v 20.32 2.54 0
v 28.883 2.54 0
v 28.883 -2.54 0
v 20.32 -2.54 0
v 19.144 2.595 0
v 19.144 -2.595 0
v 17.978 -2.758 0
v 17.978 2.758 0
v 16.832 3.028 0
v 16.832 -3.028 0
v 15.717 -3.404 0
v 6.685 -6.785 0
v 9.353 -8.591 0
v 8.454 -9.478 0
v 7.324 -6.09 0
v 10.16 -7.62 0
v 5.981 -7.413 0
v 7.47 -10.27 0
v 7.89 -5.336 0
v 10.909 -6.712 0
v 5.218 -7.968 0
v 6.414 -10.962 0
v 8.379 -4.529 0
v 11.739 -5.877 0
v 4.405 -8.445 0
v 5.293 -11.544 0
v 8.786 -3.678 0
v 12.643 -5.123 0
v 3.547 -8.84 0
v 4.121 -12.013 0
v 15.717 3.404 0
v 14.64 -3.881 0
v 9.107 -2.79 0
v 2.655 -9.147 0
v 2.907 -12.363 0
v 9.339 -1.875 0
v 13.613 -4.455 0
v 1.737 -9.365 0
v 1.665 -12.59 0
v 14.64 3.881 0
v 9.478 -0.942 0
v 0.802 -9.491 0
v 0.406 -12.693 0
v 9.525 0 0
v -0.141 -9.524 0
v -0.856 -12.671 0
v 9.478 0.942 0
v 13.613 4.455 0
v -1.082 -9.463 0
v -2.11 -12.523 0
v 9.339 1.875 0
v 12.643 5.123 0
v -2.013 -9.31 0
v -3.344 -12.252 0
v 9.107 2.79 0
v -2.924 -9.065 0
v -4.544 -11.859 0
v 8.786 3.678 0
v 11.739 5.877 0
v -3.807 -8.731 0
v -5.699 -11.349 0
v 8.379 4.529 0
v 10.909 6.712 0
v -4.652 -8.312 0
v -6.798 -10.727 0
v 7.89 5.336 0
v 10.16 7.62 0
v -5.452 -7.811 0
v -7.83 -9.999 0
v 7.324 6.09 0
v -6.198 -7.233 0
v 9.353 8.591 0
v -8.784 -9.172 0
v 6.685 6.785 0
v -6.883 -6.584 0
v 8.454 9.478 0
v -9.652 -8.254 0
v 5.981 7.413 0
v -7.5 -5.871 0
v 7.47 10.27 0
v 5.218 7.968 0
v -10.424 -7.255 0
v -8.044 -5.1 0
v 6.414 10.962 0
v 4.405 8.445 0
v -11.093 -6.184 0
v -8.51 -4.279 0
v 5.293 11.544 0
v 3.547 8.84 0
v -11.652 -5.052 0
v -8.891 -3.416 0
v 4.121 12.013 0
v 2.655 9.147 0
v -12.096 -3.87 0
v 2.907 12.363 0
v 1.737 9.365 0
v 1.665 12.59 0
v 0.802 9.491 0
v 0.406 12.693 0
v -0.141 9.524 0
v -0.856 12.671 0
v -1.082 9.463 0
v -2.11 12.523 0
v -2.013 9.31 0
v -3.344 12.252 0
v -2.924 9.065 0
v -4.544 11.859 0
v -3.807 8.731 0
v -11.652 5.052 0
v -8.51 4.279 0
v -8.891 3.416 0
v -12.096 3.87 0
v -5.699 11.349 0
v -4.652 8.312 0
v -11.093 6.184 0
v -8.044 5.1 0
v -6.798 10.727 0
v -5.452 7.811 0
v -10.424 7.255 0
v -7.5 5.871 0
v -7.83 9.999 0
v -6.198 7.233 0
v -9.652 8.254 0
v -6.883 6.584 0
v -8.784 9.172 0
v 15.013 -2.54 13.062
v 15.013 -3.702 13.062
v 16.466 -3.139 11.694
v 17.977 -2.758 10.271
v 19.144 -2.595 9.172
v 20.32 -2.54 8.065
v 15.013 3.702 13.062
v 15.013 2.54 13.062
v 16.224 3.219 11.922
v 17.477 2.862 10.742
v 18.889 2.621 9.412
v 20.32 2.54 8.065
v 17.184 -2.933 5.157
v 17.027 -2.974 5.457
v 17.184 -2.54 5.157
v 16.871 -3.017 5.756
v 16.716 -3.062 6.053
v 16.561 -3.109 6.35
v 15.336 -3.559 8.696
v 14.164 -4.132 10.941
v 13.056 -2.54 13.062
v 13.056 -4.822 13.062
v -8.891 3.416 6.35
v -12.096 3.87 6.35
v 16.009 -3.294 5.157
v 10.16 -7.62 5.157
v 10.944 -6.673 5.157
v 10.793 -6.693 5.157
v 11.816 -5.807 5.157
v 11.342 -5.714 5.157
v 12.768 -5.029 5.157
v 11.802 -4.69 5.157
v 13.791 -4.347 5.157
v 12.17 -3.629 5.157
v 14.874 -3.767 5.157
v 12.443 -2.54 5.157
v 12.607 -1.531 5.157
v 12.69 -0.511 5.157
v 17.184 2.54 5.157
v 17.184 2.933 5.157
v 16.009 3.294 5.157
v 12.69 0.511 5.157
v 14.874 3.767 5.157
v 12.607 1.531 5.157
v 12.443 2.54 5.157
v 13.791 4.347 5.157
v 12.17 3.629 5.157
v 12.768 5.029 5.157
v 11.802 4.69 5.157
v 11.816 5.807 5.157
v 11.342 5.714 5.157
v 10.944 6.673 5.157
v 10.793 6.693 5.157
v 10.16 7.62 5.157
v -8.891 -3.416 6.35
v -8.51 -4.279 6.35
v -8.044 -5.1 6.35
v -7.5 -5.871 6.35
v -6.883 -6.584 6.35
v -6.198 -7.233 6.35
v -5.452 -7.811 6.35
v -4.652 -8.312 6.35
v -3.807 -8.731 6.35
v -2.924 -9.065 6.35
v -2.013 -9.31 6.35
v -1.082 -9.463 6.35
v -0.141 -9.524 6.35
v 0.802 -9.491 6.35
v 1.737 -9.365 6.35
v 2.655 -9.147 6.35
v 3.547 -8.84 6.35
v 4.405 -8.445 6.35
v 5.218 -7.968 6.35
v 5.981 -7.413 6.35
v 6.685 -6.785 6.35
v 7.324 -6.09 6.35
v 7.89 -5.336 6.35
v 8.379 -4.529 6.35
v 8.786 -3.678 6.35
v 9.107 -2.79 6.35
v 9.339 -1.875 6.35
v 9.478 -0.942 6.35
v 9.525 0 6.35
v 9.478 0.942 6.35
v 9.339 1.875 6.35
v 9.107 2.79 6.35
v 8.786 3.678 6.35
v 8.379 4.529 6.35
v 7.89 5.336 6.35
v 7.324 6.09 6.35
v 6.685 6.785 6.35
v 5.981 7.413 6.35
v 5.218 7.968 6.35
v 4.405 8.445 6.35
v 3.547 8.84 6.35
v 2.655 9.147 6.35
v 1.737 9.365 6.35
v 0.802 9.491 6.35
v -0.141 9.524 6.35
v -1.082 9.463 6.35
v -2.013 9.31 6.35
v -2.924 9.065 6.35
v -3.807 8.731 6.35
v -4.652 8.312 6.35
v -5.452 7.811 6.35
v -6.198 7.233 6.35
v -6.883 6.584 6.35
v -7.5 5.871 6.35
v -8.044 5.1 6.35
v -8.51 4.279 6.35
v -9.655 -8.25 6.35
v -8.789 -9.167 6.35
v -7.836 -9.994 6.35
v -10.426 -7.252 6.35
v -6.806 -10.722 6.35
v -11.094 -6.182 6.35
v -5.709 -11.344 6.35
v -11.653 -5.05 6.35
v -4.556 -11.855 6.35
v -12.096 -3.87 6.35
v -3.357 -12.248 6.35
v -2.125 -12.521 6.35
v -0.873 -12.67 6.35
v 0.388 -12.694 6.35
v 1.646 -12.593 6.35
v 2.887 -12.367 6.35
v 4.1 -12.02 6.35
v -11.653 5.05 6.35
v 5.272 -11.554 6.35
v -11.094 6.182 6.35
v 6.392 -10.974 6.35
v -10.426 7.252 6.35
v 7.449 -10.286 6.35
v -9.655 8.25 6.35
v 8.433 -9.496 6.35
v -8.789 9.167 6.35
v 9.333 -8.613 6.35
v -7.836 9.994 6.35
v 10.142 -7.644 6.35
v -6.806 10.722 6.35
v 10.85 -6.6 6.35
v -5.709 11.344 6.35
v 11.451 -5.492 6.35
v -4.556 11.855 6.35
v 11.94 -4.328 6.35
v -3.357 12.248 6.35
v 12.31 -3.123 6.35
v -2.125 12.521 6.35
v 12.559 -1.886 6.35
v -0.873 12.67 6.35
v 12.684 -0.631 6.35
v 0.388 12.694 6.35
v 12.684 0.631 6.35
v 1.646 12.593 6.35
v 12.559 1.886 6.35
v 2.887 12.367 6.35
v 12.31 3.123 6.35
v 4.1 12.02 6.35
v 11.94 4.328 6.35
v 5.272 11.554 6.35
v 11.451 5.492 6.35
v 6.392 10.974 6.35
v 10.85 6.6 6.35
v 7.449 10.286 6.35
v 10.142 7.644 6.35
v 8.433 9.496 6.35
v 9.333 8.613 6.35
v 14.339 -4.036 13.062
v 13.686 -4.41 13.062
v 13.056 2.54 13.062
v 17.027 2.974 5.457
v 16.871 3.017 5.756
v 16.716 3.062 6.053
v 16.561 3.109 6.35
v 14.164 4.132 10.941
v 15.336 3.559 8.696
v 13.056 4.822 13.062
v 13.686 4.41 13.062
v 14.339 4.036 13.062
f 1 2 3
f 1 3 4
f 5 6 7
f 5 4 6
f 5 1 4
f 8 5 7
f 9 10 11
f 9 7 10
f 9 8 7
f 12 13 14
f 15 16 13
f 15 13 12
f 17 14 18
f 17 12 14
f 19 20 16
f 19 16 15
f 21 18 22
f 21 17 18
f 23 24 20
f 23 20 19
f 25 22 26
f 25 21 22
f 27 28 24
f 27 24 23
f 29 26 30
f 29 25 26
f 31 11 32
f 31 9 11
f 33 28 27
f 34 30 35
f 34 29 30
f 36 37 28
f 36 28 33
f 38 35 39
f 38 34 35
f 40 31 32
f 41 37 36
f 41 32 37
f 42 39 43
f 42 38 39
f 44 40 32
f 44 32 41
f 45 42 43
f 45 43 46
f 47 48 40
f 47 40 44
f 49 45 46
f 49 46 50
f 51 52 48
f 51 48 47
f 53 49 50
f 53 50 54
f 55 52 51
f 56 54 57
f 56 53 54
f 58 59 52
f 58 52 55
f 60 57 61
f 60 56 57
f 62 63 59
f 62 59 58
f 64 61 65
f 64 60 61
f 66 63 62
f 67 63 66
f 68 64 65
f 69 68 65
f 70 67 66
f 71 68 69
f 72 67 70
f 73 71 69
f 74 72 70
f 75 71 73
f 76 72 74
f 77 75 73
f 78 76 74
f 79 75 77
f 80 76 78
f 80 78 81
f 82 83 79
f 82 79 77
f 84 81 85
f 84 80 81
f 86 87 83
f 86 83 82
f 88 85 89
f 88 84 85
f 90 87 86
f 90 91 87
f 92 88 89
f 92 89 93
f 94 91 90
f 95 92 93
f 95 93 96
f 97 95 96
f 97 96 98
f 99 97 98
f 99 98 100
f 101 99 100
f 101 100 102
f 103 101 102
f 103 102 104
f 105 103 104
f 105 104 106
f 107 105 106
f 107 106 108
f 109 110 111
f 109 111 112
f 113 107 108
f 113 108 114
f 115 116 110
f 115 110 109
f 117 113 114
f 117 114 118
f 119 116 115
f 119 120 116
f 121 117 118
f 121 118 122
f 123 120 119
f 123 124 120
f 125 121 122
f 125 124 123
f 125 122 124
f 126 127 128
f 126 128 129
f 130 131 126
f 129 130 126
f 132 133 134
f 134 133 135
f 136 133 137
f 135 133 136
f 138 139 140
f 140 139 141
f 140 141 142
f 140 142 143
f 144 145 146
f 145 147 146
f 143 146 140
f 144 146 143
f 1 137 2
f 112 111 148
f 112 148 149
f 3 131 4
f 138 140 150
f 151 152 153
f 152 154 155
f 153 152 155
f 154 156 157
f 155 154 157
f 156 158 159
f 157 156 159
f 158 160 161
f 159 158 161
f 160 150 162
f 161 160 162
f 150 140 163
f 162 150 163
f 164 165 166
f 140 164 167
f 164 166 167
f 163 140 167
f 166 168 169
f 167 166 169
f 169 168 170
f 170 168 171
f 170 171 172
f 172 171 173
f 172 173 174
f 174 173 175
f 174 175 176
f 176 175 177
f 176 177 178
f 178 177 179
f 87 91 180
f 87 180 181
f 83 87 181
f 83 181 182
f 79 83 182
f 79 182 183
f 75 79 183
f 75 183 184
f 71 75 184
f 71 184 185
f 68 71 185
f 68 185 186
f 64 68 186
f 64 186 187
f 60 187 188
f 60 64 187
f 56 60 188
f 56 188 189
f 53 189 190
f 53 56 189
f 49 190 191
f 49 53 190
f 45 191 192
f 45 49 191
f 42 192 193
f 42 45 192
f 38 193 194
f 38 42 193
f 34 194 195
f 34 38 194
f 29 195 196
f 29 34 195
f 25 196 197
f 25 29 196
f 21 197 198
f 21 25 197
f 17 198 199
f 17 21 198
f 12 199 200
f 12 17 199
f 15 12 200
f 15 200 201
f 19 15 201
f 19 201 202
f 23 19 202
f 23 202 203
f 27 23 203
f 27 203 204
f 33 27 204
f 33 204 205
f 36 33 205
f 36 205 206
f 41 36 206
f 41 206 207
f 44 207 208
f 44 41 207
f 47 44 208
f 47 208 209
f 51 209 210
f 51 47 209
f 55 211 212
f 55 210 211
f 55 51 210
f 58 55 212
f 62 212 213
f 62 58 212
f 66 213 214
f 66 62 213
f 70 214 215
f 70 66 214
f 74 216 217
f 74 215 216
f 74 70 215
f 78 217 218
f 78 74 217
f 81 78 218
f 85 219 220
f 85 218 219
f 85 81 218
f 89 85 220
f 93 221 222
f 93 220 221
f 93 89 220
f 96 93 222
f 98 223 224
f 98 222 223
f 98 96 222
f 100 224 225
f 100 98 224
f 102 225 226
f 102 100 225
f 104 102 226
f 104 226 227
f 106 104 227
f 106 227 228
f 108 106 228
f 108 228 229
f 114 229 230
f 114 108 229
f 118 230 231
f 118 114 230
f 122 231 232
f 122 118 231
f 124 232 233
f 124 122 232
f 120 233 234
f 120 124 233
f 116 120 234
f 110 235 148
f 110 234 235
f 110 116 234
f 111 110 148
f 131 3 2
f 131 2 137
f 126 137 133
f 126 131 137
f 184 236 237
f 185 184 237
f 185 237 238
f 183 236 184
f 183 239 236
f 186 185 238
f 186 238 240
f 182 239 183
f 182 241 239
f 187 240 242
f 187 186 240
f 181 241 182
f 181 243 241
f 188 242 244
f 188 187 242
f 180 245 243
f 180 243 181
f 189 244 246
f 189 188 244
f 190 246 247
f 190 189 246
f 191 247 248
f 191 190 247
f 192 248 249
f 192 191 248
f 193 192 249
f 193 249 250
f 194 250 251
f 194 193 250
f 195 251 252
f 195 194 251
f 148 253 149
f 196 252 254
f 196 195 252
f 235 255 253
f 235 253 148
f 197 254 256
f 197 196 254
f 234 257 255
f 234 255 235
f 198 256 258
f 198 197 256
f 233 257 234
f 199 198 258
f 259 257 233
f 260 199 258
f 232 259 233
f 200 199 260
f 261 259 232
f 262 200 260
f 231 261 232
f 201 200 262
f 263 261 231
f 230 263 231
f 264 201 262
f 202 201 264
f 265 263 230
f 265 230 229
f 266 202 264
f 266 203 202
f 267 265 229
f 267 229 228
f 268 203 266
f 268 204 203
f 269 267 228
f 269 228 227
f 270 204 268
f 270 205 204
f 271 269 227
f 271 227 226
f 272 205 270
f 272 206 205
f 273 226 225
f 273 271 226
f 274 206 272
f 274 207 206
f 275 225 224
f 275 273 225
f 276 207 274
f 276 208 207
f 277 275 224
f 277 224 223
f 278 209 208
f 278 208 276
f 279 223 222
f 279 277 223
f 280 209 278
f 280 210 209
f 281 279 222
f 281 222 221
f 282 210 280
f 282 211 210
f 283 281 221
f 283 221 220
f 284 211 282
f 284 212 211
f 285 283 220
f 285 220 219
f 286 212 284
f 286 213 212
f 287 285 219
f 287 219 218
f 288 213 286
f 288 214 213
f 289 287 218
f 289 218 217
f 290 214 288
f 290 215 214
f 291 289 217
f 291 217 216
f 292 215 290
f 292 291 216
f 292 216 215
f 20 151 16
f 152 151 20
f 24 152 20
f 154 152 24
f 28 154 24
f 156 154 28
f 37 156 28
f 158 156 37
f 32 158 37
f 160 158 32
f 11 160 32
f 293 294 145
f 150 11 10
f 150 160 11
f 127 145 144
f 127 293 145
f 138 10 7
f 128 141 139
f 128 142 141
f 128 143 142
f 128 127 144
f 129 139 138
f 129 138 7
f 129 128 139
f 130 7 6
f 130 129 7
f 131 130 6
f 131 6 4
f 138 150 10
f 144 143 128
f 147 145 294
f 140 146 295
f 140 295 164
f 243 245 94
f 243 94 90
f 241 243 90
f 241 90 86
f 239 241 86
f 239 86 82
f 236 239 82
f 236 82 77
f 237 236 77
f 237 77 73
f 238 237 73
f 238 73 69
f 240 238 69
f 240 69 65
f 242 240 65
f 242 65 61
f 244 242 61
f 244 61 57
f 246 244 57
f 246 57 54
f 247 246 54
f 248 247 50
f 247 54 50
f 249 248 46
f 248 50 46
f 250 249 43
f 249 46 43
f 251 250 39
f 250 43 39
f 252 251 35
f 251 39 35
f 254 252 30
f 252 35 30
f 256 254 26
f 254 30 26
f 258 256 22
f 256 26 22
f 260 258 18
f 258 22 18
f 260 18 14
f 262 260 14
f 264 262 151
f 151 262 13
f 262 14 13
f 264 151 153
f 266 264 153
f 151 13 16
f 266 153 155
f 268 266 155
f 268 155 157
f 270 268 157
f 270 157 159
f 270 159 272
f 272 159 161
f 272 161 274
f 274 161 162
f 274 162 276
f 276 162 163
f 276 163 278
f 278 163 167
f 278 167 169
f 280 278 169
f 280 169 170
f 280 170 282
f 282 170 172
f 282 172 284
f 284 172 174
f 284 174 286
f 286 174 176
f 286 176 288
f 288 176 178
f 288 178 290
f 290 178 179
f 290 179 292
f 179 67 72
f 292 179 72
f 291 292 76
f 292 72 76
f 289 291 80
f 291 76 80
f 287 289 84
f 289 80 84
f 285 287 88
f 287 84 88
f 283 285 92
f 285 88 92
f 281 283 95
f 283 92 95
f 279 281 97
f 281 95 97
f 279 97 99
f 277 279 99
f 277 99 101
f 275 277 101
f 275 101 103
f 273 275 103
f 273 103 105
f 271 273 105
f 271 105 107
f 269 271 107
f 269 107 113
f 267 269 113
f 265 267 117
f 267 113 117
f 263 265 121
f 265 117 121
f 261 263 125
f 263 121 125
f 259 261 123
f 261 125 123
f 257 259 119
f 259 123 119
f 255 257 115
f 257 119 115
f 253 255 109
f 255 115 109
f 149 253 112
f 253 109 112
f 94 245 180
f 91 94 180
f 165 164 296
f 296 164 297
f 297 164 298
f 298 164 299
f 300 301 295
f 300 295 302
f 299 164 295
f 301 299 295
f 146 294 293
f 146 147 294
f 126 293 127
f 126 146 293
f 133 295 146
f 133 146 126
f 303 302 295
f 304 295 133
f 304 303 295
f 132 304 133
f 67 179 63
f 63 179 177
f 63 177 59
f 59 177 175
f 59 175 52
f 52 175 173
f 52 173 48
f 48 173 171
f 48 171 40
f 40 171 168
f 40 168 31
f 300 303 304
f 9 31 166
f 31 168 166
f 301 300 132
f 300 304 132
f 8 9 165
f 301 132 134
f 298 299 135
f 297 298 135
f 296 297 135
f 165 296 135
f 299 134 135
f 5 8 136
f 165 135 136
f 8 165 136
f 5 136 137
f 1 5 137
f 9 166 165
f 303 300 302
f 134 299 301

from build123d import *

# Parameters (mm, degrees)
F0_R          = 12.7
F0_R_2        = 9.525
F2_DEPTH      = 6.35
F4_DEPTH      = 25.4
F6_DEPTH      = 2.54
F6_DEPTH_BACK = 2.54
F7_T4_DEPTH   = 24.8484443303
F7_T12_DEPTH  = 24.8484443303
F7_T19_DEPTH  = 5.1569640636
F7_T24_DEPTH  = 5.1569640636
F8_T4_DEPTH   = 24.8484443303
F8_T12_DEPTH  = 24.8484443303
F8_T19_DEPTH  = 5.1569640636
F8_T24_DEPTH  = 5.1569640636


# Not quite as in the source:
# - a fillet or chamfer that OpenCascade refuses, or shapes differently, is made with other operations: its cross-section is extruded or revolved along the edge and cut away or added


with BuildPart() as f2:
    # F0 (on Top) → F2 (new body)
    with BuildSketch(Plane.XY):
        Circle(F0_R)
        Circle(F0_R_2, mode=Mode.SUBTRACT)
    extrude(amount=F2_DEPTH)

    # F3 (on face) → F4 (cut)
    with BuildSketch(Plane.XY.offset(6.35)):
        with BuildLine():
            Line((2.0157811232, 1.8745124225), (-12.0961464615, 3.8695272039))
            ThreePointArc((-12.0961464615, 3.8695272039), (-12.7, 0), (-12.0961464615, -3.8695272039))
            Line((-12.0961464615, -3.8695272039), (2.0157811232, -1.8745124225))
            Line((2.0157811232, -1.8745124225), (2.0157811232, 1.8745124225))
        make_face()
    extrude(amount=-F4_DEPTH, mode=Mode.SUBTRACT)

    # F5 (on Front) → F6 (join, two sides)
    with BuildSketch(Plane.XZ) as f6_sk:
        Polygon((10.5609930441, 5.1569640636), (10.7068819925, 0), (28.8828521035, 0), (15.0134566239, 13.0622601137), (13.0563958547, 13.0622601137), (17.1839392743, 5.1569640636), align=None)
    extrude(amount=F6_DEPTH)
    extrude(f6_sk.sketch, amount=-F6_DEPTH_BACK)

    # F7: fillet of radius 12.7 on 1 edges, made by hand


with BuildPart() as f7_tool2:
    # F7_s3 → F7_t4 (new body)
    with BuildSketch(Plane.XY.offset(24.8484443303)):
        with BuildLine():
            ThreePointArc((10.16, -7.62), (14.6403873372, -3.8807746743), (20.32, -2.54))
            Line((20.32, -2.54), (12.4434078933, -2.54))
            ThreePointArc((12.4434078933, -2.54), (11.5836139481, -5.206715654), (10.16, -7.62))
        make_face()
    extrude(amount=-F7_T4_DEPTH)

    split(bisect_by=Plane.XY.offset(6.35), keep=Keep.TOP)

    split(bisect_by=Plane(origin=(15.6186590558, 0, 8.1548740238), x_dir=(0, 1, 0), z_dir=(0.8864449555, 0, 0.4628340317)), keep=Keep.TOP)

    split(bisect_by=Plane.XY.offset(13.0622601137), keep=Keep.BOTTOM)

    split(bisect_by=Plane(origin=(13.5765905704, 0, 14.4155071364), x_dir=(0, 1, 0), z_dir=(-0.6856071252, 0, -0.7279717507)), keep=Keep.TOP)


with BuildPart() as f2_1:
    add(f2.part)

    # F7_t1: union F7_tool2
    add(f7_tool2.part)


with BuildPart() as f7_tool10:
    # F7_s11 → F7_t12 (new body)
    with BuildSketch(Plane.XY.offset(24.8484443303)):
        with BuildLine():
            ThreePointArc((10.16, -7.62), (14.6403873372, -3.8807746743), (20.32, -2.54))
            Line((20.32, -2.54), (12.4434078933, -2.54))
            ThreePointArc((12.4434078933, -2.54), (11.5836139481, -5.206715654), (10.16, -7.62))
        make_face()
    extrude(amount=-F7_T12_DEPTH)

    split(bisect_by=Plane.XY.offset(5.1569640636), keep=Keep.TOP)

    split(bisect_by=Plane.XY.offset(6.35), keep=Keep.BOTTOM)

    split(bisect_by=Plane(origin=(15.6186590558, 0, 8.1548740238), x_dir=(0, 1, 0), z_dir=(0.8864449555, 0, 0.4628340317)), keep=Keep.TOP)


with BuildPart() as f2_2:
    add(f2_1.part)

    # F7_t9: union F7_tool10
    add(f7_tool10.part)


with BuildPart() as f7_tool17:
    # F7_s18 → F7_t19 (new body)
    with BuildSketch(Plane.XY.offset(5.1569640636)):
        with BuildLine():
            ThreePointArc((10.16, -7.62), (14.6403873372, -3.8807746743), (20.32, -2.54))
            Line((20.32, -2.54), (12.4434078933, -2.54))
            ThreePointArc((12.4434078933, -2.54), (11.5836139481, -5.206715654), (10.16, -7.62))
        make_face()
    extrude(amount=-F7_T19_DEPTH)

    split(bisect_by=Plane(origin=(15.6186590558, 0, 8.1548740238), x_dir=(0, 1, 0), z_dir=(0.8864449555, 0, 0.4628340317)), keep=Keep.TOP)


with BuildPart() as f2_3:
    add(f2_2.part)

    # F7_t16: union F7_tool17
    add(f7_tool17.part)


with BuildPart() as f7_tool22:
    # F7_s23 → F7_t24 (new body)
    with BuildSketch(Plane.XY.offset(5.1569640636)):
        with BuildLine():
            ThreePointArc((10.16, -7.62), (14.6403873372, -3.8807746743), (20.32, -2.54))
            Line((20.32, -2.54), (12.4434078933, -2.54))
            ThreePointArc((12.4434078933, -2.54), (11.5836139481, -5.206715654), (10.16, -7.62))
        make_face()
    extrude(amount=-F7_T24_DEPTH)

    split(bisect_by=Plane(origin=(15.6186590558, 0, 8.1548740238), x_dir=(0, 1, 0), z_dir=(-0.8864449555, 0, -0.4628340317)), keep=Keep.TOP)


with BuildPart() as f2_4:
    add(f2_3.part)

    # F7_t21: union F7_tool22
    add(f7_tool22.part)

    # F8: fillet of radius 12.7 on 1 edges, made by hand


with BuildPart() as f8_tool2:
    # F8_s3 → F8_t4 (new body)
    with BuildSketch(Plane.XY.offset(24.8484443303)):
        with BuildLine():
            ThreePointArc((10.16, 7.62), (14.6403873372, 3.8807746743), (20.32, 2.54))
            Line((20.32, 2.54), (12.4434078933, 2.54))
            ThreePointArc((12.4434078933, 2.54), (11.5836139481, 5.206715654), (10.16, 7.62))
        make_face()
    extrude(amount=-F8_T4_DEPTH)

    split(bisect_by=Plane.XY.offset(6.35), keep=Keep.TOP)

    split(bisect_by=Plane(origin=(15.6186590558, 0, 8.1548740238), x_dir=(0, 1, 0), z_dir=(0.8864449555, 0, 0.4628340317)), keep=Keep.TOP)

    split(bisect_by=Plane.XY.offset(13.0622601137), keep=Keep.BOTTOM)

    split(bisect_by=Plane(origin=(13.5765905704, 0, 14.4155071364), x_dir=(0, 1, 0), z_dir=(-0.6856071252, 0, -0.7279717507)), keep=Keep.TOP)


with BuildPart() as f2_5:
    add(f2_4.part)

    # F8_t1: union F8_tool2
    add(f8_tool2.part)


with BuildPart() as f8_tool10:
    # F8_s11 → F8_t12 (new body)
    with BuildSketch(Plane.XY.offset(24.8484443303)):
        with BuildLine():
            ThreePointArc((10.16, 7.62), (14.6403873372, 3.8807746743), (20.32, 2.54))
            Line((20.32, 2.54), (12.4434078933, 2.54))
            ThreePointArc((12.4434078933, 2.54), (11.5836139481, 5.206715654), (10.16, 7.62))
        make_face()
    extrude(amount=-F8_T12_DEPTH)

    split(bisect_by=Plane.XY.offset(5.1569640636), keep=Keep.TOP)

    split(bisect_by=Plane.XY.offset(6.35), keep=Keep.BOTTOM)

    split(bisect_by=Plane(origin=(15.6186590558, 0, 8.1548740238), x_dir=(0, 1, 0), z_dir=(0.8864449555, 0, 0.4628340317)), keep=Keep.TOP)


with BuildPart() as f2_6:
    add(f2_5.part)

    # F8_t9: union F8_tool10
    add(f8_tool10.part)


with BuildPart() as f8_tool17:
    # F8_s18 → F8_t19 (new body)
    with BuildSketch(Plane.XY.offset(5.1569640636)):
        with BuildLine():
            ThreePointArc((10.16, 7.62), (14.6403873372, 3.8807746743), (20.32, 2.54))
            Line((20.32, 2.54), (12.4434078933, 2.54))
            ThreePointArc((12.4434078933, 2.54), (11.5836139481, 5.206715654), (10.16, 7.62))
        make_face()
    extrude(amount=-F8_T19_DEPTH)

    split(bisect_by=Plane(origin=(15.6186590558, 0, 8.1548740238), x_dir=(0, 1, 0), z_dir=(0.8864449555, 0, 0.4628340317)), keep=Keep.TOP)


with BuildPart() as f2_7:
    add(f2_6.part)

    # F8_t16: union F8_tool17
    add(f8_tool17.part)


with BuildPart() as f8_tool22:
    # F8_s23 → F8_t24 (new body)
    with BuildSketch(Plane.XY.offset(5.1569640636)):
        with BuildLine():
            ThreePointArc((10.16, 7.62), (14.6403873372, 3.8807746743), (20.32, 2.54))
            Line((20.32, 2.54), (12.4434078933, 2.54))
            ThreePointArc((12.4434078933, 2.54), (11.5836139481, 5.206715654), (10.16, 7.62))
        make_face()
    extrude(amount=-F8_T24_DEPTH)

    split(bisect_by=Plane(origin=(15.6186590558, 0, 8.1548740238), x_dir=(0, 1, 0), z_dir=(-0.8864449555, 0, -0.4628340317)), keep=Keep.TOP)


with BuildPart() as f2_8:
    add(f2_7.part)

    # F8_t21: union F8_tool22
    add(f8_tool22.part)


solid = f2_8.part
